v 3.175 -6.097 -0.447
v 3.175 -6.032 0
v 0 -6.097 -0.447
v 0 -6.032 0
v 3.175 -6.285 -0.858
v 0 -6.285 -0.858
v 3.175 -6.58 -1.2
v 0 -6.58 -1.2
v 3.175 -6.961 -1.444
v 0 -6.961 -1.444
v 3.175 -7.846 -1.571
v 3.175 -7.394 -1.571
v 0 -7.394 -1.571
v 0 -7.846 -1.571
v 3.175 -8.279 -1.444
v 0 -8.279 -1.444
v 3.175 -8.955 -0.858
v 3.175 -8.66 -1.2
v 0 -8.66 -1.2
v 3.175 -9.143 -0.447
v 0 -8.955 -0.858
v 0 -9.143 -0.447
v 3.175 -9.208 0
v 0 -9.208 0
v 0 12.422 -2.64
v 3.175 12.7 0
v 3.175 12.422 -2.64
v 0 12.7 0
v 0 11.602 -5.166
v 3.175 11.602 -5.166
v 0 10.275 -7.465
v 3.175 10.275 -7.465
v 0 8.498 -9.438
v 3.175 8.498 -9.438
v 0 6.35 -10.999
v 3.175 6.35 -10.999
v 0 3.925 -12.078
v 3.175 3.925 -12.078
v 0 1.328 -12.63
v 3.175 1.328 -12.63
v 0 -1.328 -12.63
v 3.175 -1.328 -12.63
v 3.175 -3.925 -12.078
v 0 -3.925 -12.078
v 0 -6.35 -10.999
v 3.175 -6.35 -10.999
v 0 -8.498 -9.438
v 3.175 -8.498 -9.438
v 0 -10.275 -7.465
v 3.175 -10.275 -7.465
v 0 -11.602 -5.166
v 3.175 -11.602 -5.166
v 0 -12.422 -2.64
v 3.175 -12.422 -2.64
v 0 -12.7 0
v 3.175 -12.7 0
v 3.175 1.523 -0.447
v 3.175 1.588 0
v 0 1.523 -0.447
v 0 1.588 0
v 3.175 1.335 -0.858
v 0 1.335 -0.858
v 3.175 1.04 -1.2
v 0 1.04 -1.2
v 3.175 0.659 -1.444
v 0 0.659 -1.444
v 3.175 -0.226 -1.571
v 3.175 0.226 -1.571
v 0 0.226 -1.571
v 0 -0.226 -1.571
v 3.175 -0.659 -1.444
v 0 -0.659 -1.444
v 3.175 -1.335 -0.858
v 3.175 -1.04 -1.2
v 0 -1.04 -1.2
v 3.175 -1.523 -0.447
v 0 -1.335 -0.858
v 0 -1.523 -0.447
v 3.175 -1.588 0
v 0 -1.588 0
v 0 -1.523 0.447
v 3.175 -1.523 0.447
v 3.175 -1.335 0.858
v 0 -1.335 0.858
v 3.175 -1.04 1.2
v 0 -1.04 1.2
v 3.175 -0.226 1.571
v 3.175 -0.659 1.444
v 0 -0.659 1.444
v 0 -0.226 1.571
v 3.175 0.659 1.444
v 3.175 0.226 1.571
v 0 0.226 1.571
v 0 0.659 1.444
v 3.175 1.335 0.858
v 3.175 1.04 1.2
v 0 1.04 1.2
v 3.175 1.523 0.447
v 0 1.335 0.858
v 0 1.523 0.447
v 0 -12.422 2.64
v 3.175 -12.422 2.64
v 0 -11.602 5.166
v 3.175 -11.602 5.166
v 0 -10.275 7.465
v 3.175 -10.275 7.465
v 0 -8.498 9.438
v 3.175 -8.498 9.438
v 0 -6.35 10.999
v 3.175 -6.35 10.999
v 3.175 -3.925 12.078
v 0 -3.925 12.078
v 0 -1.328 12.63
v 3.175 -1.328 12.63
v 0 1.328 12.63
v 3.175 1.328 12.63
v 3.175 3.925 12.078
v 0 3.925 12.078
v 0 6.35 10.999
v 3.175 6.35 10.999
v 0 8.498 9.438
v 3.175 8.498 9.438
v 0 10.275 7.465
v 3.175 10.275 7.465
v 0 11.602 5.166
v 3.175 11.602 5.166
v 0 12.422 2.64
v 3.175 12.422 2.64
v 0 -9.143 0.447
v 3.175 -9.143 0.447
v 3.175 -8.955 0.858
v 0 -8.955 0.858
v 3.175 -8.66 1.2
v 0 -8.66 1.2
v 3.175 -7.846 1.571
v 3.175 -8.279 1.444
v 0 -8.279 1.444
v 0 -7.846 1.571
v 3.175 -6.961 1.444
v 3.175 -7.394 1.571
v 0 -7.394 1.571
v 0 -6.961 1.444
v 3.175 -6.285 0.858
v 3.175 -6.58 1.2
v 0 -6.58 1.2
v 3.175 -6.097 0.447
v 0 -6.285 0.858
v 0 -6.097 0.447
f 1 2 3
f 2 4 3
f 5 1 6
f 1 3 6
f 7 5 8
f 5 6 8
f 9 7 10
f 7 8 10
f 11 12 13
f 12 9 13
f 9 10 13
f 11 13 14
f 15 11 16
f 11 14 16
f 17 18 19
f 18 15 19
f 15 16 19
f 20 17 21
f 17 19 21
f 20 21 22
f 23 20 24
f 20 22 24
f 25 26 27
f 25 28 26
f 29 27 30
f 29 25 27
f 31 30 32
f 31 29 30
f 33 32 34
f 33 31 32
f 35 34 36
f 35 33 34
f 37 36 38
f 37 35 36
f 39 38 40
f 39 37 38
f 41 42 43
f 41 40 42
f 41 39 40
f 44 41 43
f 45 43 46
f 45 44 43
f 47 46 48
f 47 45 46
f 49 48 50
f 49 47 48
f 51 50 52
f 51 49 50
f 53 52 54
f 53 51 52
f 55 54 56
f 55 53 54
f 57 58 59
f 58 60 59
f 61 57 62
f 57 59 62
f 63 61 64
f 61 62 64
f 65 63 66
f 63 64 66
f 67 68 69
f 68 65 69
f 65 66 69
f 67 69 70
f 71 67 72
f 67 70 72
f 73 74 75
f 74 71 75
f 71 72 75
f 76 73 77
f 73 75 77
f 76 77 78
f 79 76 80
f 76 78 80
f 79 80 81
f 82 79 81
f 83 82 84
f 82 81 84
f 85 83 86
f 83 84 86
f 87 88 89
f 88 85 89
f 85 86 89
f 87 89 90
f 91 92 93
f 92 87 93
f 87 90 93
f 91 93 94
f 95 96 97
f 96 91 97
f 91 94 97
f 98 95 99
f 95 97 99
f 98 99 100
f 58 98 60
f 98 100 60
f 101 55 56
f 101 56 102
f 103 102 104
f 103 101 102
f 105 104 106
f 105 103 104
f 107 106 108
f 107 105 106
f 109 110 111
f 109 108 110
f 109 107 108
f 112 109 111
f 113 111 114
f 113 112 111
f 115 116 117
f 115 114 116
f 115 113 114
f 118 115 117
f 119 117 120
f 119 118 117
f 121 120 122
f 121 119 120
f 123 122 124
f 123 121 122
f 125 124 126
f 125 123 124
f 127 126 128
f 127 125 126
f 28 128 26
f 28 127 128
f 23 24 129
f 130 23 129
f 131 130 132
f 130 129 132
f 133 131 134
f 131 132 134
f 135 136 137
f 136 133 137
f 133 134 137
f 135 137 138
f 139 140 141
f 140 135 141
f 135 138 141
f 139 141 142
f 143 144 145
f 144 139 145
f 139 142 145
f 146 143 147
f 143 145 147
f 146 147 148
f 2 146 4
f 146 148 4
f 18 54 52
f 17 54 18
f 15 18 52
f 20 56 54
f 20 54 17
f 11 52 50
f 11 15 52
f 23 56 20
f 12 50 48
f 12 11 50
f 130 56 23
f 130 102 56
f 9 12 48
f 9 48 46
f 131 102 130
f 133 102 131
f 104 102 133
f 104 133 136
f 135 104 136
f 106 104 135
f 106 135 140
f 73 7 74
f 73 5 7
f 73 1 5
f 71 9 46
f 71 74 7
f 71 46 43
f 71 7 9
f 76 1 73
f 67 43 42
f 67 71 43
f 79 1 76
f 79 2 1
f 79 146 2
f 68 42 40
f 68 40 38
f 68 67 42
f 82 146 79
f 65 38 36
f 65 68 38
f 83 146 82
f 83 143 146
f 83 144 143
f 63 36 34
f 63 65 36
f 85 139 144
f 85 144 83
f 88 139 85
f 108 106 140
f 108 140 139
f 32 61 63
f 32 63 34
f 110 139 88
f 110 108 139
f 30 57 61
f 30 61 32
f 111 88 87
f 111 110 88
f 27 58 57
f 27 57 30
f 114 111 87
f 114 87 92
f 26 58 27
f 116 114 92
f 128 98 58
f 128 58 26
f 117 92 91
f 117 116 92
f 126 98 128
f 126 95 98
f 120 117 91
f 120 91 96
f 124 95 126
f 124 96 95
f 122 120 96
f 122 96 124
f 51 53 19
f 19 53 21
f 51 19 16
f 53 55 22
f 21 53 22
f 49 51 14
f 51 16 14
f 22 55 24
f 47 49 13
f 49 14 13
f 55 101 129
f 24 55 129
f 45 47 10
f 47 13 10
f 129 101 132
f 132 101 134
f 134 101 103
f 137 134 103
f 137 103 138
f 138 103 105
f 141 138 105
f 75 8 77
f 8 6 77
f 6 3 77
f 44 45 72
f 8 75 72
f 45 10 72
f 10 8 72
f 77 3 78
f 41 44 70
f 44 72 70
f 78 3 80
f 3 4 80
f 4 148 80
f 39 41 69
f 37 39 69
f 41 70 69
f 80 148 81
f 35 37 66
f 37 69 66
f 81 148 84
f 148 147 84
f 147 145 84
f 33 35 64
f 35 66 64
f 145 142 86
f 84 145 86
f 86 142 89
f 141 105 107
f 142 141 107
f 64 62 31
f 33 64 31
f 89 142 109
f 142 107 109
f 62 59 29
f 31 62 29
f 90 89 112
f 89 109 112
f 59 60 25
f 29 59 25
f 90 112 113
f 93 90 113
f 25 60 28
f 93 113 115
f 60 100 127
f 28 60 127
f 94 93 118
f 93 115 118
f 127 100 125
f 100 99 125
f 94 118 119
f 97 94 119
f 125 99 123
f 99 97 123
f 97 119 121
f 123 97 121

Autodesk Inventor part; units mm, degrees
ref_plane "YZ Plane" through (0, 0, 0) normal (1, 0, 0) x (0, 1, 0)
ref_plane "XZ Plane" through (0, 0, 0) normal (0, 1, 0) x (-1, 0, 0)
ref_plane "XY Plane" through (0, 0, 0) normal (0, 0, 1) x (1, 0, 0)
sketch "Sketch1" plane through (0, 0, 0) normal (1, 0, 0) x (0, 1, 0)
  circle A0 centre (0, 0) radius 12.7
  circle A1 centre (0, 0) radius 1.5875
  line L0 (-12.7, 0) -> (-1.5875, 0)
  circle A2 centre (-7.62, 0) radius 1.5875
  dimension "d0" = 25.4
  dimension "d1" = 3.175
  dimension "d2" = 3.175
  dimension "d3" = 5.08
extrude "Extrusion1" add sketch "Sketch1" along normal blind 3.175
properties part number "CURM_Caterpillar_wheel"
